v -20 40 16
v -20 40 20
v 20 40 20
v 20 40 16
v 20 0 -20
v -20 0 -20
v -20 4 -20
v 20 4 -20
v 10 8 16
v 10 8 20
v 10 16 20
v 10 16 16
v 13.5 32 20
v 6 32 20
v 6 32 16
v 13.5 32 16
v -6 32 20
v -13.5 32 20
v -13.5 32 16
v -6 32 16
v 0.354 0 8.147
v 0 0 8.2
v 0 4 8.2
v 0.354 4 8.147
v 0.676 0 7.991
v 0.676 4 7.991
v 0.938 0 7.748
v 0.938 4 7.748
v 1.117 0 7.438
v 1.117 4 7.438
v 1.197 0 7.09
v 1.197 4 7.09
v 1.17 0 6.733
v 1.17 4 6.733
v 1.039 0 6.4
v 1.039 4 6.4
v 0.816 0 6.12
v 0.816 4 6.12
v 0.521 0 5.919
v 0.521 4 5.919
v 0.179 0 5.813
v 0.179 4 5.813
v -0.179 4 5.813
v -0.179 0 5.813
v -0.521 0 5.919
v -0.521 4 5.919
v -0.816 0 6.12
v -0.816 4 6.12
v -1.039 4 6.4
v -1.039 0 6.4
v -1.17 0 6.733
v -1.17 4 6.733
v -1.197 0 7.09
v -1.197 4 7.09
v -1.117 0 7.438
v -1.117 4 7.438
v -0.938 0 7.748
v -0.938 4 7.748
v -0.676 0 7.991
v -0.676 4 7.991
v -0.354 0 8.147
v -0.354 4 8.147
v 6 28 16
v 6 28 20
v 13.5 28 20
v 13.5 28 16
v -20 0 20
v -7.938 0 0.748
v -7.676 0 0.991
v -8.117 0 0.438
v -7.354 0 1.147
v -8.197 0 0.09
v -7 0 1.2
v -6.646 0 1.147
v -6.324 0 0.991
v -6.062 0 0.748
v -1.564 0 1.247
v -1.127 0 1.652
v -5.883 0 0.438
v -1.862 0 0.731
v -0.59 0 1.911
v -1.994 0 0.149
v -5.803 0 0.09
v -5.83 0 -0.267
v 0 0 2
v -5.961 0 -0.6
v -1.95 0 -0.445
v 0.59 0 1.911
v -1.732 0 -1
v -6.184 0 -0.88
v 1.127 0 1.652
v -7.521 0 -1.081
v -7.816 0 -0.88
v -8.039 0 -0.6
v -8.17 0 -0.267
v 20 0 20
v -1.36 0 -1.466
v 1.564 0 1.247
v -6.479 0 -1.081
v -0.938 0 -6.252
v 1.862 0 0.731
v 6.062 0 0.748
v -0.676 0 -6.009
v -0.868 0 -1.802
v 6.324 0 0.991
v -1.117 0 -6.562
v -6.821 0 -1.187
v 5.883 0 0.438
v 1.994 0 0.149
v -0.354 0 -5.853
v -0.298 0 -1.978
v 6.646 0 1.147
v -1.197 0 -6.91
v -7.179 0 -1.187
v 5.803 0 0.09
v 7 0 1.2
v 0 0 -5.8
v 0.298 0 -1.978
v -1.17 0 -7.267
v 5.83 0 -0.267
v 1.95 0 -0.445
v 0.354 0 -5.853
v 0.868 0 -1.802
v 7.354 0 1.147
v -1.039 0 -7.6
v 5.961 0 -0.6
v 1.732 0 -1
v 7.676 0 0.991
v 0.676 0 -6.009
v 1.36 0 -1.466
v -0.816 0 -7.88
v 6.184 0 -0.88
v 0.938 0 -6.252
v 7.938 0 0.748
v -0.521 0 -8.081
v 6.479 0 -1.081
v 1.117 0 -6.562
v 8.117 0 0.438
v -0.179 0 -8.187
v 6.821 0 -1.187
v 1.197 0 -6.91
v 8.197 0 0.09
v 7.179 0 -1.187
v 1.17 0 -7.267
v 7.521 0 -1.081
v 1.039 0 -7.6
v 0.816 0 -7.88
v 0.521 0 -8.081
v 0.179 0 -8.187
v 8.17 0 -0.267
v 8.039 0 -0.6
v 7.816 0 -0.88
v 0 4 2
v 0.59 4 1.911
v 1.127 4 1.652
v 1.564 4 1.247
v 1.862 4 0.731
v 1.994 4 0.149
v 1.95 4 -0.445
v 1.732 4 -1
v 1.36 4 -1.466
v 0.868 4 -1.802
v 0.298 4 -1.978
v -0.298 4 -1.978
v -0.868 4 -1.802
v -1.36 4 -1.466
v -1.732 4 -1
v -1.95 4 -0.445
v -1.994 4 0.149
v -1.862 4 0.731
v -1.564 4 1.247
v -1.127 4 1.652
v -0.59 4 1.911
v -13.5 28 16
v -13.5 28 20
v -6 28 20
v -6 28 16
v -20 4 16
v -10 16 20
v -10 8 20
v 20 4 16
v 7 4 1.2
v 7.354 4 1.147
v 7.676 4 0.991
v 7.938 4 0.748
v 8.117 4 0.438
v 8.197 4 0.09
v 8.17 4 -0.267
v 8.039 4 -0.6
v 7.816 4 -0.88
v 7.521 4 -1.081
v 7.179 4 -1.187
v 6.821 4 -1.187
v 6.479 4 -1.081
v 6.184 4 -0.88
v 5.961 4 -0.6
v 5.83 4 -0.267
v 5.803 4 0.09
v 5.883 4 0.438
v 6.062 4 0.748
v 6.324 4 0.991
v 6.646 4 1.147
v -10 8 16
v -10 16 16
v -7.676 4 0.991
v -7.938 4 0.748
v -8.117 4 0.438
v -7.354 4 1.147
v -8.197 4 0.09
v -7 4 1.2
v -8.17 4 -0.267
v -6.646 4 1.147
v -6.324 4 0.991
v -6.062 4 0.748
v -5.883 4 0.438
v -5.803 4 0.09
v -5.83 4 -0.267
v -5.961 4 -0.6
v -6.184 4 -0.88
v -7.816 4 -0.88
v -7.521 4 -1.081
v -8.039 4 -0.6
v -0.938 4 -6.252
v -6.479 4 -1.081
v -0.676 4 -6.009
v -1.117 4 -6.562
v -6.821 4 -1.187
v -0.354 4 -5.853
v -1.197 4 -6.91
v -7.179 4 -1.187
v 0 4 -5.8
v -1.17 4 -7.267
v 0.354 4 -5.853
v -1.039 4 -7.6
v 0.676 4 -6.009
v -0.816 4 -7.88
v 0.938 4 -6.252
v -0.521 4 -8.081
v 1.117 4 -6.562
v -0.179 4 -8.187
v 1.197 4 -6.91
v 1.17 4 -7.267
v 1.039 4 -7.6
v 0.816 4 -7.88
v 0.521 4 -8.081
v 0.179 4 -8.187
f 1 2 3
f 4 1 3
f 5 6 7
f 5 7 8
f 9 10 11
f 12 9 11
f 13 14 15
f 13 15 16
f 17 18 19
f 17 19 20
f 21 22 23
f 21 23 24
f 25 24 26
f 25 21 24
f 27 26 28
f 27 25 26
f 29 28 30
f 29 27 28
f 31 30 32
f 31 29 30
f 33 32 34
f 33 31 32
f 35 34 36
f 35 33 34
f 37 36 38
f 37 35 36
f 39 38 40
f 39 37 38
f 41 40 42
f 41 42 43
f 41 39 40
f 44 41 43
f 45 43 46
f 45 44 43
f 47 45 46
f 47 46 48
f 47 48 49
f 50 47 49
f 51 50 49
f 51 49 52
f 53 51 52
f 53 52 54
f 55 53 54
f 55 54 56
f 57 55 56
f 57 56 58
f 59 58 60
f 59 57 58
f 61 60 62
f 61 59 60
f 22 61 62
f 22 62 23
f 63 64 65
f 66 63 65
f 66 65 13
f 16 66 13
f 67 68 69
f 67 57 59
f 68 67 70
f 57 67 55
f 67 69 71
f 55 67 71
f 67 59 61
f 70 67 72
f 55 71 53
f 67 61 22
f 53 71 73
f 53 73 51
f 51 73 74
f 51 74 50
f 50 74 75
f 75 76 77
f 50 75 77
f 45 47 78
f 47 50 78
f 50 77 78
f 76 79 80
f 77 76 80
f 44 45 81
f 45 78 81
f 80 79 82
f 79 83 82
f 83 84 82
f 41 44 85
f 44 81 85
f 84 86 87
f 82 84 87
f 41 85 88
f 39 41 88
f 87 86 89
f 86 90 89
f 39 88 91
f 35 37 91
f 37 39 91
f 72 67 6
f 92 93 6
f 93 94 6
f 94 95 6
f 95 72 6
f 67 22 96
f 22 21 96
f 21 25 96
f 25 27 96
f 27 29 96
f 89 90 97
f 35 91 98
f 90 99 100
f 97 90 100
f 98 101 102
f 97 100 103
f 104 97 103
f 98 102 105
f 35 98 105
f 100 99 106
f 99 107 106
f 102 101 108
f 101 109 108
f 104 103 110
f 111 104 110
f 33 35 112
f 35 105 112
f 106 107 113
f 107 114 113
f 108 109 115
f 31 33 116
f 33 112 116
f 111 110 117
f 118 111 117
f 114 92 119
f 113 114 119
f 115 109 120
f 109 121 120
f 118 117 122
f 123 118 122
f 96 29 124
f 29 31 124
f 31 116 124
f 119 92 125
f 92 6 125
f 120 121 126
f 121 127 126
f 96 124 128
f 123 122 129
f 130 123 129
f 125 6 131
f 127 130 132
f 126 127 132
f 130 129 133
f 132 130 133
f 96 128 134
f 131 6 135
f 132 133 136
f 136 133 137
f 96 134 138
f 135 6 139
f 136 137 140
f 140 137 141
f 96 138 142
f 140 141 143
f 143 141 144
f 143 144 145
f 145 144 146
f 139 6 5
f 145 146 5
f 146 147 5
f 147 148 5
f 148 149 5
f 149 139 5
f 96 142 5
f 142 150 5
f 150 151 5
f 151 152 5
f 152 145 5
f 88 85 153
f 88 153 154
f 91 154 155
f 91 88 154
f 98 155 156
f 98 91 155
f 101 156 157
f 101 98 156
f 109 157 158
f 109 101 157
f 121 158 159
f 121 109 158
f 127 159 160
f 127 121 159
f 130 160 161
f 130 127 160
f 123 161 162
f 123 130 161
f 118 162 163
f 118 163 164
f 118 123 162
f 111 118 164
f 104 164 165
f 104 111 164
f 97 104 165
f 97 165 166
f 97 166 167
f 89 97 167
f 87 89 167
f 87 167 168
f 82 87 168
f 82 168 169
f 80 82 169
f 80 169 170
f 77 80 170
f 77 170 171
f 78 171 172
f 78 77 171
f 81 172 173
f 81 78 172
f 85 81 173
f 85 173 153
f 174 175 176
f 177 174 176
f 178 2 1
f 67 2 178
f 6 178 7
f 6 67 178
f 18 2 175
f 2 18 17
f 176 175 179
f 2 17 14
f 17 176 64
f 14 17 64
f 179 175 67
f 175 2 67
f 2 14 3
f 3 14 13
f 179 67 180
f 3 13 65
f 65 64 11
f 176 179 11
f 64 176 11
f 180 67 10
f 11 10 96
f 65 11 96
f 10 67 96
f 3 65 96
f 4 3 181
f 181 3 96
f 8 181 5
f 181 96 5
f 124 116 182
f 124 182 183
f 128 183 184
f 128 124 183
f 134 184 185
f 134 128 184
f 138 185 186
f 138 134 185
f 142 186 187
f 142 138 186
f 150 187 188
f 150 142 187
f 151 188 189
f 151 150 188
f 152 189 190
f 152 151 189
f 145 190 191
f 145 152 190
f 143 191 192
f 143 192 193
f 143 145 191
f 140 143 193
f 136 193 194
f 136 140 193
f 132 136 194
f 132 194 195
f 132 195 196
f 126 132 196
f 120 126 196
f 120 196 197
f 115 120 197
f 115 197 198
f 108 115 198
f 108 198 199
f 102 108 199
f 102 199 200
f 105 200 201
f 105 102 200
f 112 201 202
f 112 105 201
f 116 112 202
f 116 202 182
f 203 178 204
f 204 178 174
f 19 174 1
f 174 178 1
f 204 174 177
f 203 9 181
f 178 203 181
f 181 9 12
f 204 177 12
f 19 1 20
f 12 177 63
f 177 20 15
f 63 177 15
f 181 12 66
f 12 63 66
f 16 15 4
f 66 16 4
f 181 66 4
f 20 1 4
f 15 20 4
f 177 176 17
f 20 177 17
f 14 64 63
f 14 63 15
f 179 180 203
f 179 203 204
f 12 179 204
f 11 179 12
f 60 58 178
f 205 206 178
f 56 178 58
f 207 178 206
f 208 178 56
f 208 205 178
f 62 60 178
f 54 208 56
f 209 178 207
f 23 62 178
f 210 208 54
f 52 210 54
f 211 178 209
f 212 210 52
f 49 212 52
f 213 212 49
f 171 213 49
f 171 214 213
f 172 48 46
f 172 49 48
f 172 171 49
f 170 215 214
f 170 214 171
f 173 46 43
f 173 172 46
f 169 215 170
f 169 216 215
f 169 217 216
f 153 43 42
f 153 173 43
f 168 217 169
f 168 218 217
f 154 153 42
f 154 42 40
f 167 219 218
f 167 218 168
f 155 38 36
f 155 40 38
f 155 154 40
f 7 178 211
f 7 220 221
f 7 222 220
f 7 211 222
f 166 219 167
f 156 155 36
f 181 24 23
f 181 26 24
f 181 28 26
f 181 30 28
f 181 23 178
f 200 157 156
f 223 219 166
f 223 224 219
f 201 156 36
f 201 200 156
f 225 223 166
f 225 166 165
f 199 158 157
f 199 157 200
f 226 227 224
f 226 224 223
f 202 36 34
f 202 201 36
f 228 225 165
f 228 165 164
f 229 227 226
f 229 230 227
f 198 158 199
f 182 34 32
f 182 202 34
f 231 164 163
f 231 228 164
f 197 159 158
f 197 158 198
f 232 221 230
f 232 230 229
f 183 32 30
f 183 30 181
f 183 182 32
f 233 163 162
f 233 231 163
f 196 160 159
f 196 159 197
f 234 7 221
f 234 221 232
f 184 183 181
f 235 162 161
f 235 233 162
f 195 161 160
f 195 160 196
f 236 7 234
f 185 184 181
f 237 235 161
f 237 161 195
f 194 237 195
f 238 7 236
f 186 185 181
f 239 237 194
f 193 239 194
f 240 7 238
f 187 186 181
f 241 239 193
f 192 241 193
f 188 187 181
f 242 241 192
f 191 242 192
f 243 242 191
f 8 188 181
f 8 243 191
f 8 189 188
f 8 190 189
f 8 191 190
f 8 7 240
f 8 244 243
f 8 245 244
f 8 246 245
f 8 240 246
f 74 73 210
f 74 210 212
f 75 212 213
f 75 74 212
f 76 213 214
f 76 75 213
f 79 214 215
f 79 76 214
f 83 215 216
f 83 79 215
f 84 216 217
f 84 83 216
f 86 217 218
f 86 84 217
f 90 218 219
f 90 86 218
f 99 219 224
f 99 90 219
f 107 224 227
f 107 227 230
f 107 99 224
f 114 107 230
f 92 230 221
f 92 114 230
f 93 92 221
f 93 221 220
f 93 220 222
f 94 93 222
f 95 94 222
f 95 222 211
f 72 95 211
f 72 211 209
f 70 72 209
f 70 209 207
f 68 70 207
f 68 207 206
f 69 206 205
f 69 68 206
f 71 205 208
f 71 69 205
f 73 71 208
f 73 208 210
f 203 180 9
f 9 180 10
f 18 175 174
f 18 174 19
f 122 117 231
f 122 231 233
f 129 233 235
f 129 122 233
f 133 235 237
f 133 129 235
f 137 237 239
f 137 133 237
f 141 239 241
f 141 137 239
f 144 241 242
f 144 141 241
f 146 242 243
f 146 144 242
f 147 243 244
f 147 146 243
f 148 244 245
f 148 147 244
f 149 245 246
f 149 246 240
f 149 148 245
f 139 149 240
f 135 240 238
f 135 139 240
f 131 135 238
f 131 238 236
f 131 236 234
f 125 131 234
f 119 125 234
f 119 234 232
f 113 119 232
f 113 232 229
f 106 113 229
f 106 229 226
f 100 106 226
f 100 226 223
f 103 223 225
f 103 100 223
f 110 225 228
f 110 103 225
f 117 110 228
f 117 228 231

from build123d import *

# Parameters (mm, degrees)
SKETCH1_W           = 40
SKETCH1_H           = 40
SKETCH1_R           = 2
SKETCH1_R_2         = 1.2
BOSS_EXTRUDE1_DEPTH = 4
SKETCH2_W           = 40
SKETCH2_H           = 40
BOSS_EXTRUDE2_DEPTH = 4
SKETCH3_W           = 7.5
SKETCH3_H           = 4
SKETCH3_W_2         = 20
SKETCH3_H_2         = 8
CUT_EXTRUDE1_DEPTH  = 4


with BuildPart() as part:
    # Sketch1 → Boss-Extrude1 (new body)
    with BuildSketch(Plane(origin=(0, 0, 0), x_dir=(1, 0, 0), z_dir=(0, 1, 0))):
        Rectangle(SKETCH1_W, SKETCH1_H)
        with Locations(Location((0, 0, 0), (0, 0, 270))):
            Circle(SKETCH1_R, mode=Mode.SUBTRACT)
        with Locations(Location((7, 0, 0), (0, 0, 270))):
            Circle(SKETCH1_R_2, mode=Mode.SUBTRACT)
        with Locations(Location((0, -7, 0), (0, 0, 270))):
            Circle(SKETCH1_R_2, mode=Mode.SUBTRACT)
        with Locations(Location((-7, 0, 0), (0, 0, 270))):
            Circle(SKETCH1_R_2, mode=Mode.SUBTRACT)
        with Locations(Location((0, 7, 0), (0, 0, 270))):
            Circle(SKETCH1_R_2, mode=Mode.SUBTRACT)
    extrude(amount=BOSS_EXTRUDE1_DEPTH)

    # Sketch2 → Boss-Extrude2 (add)
    with BuildSketch(Plane.XY.offset(20)):
        with Locations((0, 20)):
            Rectangle(SKETCH2_W, SKETCH2_H)
    extrude(amount=-BOSS_EXTRUDE2_DEPTH)

    # Sketch3 → Cut-Extrude1 (cut)
    with BuildSketch(Plane.XY.offset(20)):
        with Locations((-9.75, 30)):
            Rectangle(SKETCH3_W, SKETCH3_H)
        with Locations((9.75, 30)):
            Rectangle(SKETCH3_W, SKETCH3_H)
        with Locations((0, 12)):
            Rectangle(SKETCH3_W_2, SKETCH3_H_2)
    extrude(amount=-CUT_EXTRUDE1_DEPTH, mode=Mode.SUBTRACT)


solid = part.part
